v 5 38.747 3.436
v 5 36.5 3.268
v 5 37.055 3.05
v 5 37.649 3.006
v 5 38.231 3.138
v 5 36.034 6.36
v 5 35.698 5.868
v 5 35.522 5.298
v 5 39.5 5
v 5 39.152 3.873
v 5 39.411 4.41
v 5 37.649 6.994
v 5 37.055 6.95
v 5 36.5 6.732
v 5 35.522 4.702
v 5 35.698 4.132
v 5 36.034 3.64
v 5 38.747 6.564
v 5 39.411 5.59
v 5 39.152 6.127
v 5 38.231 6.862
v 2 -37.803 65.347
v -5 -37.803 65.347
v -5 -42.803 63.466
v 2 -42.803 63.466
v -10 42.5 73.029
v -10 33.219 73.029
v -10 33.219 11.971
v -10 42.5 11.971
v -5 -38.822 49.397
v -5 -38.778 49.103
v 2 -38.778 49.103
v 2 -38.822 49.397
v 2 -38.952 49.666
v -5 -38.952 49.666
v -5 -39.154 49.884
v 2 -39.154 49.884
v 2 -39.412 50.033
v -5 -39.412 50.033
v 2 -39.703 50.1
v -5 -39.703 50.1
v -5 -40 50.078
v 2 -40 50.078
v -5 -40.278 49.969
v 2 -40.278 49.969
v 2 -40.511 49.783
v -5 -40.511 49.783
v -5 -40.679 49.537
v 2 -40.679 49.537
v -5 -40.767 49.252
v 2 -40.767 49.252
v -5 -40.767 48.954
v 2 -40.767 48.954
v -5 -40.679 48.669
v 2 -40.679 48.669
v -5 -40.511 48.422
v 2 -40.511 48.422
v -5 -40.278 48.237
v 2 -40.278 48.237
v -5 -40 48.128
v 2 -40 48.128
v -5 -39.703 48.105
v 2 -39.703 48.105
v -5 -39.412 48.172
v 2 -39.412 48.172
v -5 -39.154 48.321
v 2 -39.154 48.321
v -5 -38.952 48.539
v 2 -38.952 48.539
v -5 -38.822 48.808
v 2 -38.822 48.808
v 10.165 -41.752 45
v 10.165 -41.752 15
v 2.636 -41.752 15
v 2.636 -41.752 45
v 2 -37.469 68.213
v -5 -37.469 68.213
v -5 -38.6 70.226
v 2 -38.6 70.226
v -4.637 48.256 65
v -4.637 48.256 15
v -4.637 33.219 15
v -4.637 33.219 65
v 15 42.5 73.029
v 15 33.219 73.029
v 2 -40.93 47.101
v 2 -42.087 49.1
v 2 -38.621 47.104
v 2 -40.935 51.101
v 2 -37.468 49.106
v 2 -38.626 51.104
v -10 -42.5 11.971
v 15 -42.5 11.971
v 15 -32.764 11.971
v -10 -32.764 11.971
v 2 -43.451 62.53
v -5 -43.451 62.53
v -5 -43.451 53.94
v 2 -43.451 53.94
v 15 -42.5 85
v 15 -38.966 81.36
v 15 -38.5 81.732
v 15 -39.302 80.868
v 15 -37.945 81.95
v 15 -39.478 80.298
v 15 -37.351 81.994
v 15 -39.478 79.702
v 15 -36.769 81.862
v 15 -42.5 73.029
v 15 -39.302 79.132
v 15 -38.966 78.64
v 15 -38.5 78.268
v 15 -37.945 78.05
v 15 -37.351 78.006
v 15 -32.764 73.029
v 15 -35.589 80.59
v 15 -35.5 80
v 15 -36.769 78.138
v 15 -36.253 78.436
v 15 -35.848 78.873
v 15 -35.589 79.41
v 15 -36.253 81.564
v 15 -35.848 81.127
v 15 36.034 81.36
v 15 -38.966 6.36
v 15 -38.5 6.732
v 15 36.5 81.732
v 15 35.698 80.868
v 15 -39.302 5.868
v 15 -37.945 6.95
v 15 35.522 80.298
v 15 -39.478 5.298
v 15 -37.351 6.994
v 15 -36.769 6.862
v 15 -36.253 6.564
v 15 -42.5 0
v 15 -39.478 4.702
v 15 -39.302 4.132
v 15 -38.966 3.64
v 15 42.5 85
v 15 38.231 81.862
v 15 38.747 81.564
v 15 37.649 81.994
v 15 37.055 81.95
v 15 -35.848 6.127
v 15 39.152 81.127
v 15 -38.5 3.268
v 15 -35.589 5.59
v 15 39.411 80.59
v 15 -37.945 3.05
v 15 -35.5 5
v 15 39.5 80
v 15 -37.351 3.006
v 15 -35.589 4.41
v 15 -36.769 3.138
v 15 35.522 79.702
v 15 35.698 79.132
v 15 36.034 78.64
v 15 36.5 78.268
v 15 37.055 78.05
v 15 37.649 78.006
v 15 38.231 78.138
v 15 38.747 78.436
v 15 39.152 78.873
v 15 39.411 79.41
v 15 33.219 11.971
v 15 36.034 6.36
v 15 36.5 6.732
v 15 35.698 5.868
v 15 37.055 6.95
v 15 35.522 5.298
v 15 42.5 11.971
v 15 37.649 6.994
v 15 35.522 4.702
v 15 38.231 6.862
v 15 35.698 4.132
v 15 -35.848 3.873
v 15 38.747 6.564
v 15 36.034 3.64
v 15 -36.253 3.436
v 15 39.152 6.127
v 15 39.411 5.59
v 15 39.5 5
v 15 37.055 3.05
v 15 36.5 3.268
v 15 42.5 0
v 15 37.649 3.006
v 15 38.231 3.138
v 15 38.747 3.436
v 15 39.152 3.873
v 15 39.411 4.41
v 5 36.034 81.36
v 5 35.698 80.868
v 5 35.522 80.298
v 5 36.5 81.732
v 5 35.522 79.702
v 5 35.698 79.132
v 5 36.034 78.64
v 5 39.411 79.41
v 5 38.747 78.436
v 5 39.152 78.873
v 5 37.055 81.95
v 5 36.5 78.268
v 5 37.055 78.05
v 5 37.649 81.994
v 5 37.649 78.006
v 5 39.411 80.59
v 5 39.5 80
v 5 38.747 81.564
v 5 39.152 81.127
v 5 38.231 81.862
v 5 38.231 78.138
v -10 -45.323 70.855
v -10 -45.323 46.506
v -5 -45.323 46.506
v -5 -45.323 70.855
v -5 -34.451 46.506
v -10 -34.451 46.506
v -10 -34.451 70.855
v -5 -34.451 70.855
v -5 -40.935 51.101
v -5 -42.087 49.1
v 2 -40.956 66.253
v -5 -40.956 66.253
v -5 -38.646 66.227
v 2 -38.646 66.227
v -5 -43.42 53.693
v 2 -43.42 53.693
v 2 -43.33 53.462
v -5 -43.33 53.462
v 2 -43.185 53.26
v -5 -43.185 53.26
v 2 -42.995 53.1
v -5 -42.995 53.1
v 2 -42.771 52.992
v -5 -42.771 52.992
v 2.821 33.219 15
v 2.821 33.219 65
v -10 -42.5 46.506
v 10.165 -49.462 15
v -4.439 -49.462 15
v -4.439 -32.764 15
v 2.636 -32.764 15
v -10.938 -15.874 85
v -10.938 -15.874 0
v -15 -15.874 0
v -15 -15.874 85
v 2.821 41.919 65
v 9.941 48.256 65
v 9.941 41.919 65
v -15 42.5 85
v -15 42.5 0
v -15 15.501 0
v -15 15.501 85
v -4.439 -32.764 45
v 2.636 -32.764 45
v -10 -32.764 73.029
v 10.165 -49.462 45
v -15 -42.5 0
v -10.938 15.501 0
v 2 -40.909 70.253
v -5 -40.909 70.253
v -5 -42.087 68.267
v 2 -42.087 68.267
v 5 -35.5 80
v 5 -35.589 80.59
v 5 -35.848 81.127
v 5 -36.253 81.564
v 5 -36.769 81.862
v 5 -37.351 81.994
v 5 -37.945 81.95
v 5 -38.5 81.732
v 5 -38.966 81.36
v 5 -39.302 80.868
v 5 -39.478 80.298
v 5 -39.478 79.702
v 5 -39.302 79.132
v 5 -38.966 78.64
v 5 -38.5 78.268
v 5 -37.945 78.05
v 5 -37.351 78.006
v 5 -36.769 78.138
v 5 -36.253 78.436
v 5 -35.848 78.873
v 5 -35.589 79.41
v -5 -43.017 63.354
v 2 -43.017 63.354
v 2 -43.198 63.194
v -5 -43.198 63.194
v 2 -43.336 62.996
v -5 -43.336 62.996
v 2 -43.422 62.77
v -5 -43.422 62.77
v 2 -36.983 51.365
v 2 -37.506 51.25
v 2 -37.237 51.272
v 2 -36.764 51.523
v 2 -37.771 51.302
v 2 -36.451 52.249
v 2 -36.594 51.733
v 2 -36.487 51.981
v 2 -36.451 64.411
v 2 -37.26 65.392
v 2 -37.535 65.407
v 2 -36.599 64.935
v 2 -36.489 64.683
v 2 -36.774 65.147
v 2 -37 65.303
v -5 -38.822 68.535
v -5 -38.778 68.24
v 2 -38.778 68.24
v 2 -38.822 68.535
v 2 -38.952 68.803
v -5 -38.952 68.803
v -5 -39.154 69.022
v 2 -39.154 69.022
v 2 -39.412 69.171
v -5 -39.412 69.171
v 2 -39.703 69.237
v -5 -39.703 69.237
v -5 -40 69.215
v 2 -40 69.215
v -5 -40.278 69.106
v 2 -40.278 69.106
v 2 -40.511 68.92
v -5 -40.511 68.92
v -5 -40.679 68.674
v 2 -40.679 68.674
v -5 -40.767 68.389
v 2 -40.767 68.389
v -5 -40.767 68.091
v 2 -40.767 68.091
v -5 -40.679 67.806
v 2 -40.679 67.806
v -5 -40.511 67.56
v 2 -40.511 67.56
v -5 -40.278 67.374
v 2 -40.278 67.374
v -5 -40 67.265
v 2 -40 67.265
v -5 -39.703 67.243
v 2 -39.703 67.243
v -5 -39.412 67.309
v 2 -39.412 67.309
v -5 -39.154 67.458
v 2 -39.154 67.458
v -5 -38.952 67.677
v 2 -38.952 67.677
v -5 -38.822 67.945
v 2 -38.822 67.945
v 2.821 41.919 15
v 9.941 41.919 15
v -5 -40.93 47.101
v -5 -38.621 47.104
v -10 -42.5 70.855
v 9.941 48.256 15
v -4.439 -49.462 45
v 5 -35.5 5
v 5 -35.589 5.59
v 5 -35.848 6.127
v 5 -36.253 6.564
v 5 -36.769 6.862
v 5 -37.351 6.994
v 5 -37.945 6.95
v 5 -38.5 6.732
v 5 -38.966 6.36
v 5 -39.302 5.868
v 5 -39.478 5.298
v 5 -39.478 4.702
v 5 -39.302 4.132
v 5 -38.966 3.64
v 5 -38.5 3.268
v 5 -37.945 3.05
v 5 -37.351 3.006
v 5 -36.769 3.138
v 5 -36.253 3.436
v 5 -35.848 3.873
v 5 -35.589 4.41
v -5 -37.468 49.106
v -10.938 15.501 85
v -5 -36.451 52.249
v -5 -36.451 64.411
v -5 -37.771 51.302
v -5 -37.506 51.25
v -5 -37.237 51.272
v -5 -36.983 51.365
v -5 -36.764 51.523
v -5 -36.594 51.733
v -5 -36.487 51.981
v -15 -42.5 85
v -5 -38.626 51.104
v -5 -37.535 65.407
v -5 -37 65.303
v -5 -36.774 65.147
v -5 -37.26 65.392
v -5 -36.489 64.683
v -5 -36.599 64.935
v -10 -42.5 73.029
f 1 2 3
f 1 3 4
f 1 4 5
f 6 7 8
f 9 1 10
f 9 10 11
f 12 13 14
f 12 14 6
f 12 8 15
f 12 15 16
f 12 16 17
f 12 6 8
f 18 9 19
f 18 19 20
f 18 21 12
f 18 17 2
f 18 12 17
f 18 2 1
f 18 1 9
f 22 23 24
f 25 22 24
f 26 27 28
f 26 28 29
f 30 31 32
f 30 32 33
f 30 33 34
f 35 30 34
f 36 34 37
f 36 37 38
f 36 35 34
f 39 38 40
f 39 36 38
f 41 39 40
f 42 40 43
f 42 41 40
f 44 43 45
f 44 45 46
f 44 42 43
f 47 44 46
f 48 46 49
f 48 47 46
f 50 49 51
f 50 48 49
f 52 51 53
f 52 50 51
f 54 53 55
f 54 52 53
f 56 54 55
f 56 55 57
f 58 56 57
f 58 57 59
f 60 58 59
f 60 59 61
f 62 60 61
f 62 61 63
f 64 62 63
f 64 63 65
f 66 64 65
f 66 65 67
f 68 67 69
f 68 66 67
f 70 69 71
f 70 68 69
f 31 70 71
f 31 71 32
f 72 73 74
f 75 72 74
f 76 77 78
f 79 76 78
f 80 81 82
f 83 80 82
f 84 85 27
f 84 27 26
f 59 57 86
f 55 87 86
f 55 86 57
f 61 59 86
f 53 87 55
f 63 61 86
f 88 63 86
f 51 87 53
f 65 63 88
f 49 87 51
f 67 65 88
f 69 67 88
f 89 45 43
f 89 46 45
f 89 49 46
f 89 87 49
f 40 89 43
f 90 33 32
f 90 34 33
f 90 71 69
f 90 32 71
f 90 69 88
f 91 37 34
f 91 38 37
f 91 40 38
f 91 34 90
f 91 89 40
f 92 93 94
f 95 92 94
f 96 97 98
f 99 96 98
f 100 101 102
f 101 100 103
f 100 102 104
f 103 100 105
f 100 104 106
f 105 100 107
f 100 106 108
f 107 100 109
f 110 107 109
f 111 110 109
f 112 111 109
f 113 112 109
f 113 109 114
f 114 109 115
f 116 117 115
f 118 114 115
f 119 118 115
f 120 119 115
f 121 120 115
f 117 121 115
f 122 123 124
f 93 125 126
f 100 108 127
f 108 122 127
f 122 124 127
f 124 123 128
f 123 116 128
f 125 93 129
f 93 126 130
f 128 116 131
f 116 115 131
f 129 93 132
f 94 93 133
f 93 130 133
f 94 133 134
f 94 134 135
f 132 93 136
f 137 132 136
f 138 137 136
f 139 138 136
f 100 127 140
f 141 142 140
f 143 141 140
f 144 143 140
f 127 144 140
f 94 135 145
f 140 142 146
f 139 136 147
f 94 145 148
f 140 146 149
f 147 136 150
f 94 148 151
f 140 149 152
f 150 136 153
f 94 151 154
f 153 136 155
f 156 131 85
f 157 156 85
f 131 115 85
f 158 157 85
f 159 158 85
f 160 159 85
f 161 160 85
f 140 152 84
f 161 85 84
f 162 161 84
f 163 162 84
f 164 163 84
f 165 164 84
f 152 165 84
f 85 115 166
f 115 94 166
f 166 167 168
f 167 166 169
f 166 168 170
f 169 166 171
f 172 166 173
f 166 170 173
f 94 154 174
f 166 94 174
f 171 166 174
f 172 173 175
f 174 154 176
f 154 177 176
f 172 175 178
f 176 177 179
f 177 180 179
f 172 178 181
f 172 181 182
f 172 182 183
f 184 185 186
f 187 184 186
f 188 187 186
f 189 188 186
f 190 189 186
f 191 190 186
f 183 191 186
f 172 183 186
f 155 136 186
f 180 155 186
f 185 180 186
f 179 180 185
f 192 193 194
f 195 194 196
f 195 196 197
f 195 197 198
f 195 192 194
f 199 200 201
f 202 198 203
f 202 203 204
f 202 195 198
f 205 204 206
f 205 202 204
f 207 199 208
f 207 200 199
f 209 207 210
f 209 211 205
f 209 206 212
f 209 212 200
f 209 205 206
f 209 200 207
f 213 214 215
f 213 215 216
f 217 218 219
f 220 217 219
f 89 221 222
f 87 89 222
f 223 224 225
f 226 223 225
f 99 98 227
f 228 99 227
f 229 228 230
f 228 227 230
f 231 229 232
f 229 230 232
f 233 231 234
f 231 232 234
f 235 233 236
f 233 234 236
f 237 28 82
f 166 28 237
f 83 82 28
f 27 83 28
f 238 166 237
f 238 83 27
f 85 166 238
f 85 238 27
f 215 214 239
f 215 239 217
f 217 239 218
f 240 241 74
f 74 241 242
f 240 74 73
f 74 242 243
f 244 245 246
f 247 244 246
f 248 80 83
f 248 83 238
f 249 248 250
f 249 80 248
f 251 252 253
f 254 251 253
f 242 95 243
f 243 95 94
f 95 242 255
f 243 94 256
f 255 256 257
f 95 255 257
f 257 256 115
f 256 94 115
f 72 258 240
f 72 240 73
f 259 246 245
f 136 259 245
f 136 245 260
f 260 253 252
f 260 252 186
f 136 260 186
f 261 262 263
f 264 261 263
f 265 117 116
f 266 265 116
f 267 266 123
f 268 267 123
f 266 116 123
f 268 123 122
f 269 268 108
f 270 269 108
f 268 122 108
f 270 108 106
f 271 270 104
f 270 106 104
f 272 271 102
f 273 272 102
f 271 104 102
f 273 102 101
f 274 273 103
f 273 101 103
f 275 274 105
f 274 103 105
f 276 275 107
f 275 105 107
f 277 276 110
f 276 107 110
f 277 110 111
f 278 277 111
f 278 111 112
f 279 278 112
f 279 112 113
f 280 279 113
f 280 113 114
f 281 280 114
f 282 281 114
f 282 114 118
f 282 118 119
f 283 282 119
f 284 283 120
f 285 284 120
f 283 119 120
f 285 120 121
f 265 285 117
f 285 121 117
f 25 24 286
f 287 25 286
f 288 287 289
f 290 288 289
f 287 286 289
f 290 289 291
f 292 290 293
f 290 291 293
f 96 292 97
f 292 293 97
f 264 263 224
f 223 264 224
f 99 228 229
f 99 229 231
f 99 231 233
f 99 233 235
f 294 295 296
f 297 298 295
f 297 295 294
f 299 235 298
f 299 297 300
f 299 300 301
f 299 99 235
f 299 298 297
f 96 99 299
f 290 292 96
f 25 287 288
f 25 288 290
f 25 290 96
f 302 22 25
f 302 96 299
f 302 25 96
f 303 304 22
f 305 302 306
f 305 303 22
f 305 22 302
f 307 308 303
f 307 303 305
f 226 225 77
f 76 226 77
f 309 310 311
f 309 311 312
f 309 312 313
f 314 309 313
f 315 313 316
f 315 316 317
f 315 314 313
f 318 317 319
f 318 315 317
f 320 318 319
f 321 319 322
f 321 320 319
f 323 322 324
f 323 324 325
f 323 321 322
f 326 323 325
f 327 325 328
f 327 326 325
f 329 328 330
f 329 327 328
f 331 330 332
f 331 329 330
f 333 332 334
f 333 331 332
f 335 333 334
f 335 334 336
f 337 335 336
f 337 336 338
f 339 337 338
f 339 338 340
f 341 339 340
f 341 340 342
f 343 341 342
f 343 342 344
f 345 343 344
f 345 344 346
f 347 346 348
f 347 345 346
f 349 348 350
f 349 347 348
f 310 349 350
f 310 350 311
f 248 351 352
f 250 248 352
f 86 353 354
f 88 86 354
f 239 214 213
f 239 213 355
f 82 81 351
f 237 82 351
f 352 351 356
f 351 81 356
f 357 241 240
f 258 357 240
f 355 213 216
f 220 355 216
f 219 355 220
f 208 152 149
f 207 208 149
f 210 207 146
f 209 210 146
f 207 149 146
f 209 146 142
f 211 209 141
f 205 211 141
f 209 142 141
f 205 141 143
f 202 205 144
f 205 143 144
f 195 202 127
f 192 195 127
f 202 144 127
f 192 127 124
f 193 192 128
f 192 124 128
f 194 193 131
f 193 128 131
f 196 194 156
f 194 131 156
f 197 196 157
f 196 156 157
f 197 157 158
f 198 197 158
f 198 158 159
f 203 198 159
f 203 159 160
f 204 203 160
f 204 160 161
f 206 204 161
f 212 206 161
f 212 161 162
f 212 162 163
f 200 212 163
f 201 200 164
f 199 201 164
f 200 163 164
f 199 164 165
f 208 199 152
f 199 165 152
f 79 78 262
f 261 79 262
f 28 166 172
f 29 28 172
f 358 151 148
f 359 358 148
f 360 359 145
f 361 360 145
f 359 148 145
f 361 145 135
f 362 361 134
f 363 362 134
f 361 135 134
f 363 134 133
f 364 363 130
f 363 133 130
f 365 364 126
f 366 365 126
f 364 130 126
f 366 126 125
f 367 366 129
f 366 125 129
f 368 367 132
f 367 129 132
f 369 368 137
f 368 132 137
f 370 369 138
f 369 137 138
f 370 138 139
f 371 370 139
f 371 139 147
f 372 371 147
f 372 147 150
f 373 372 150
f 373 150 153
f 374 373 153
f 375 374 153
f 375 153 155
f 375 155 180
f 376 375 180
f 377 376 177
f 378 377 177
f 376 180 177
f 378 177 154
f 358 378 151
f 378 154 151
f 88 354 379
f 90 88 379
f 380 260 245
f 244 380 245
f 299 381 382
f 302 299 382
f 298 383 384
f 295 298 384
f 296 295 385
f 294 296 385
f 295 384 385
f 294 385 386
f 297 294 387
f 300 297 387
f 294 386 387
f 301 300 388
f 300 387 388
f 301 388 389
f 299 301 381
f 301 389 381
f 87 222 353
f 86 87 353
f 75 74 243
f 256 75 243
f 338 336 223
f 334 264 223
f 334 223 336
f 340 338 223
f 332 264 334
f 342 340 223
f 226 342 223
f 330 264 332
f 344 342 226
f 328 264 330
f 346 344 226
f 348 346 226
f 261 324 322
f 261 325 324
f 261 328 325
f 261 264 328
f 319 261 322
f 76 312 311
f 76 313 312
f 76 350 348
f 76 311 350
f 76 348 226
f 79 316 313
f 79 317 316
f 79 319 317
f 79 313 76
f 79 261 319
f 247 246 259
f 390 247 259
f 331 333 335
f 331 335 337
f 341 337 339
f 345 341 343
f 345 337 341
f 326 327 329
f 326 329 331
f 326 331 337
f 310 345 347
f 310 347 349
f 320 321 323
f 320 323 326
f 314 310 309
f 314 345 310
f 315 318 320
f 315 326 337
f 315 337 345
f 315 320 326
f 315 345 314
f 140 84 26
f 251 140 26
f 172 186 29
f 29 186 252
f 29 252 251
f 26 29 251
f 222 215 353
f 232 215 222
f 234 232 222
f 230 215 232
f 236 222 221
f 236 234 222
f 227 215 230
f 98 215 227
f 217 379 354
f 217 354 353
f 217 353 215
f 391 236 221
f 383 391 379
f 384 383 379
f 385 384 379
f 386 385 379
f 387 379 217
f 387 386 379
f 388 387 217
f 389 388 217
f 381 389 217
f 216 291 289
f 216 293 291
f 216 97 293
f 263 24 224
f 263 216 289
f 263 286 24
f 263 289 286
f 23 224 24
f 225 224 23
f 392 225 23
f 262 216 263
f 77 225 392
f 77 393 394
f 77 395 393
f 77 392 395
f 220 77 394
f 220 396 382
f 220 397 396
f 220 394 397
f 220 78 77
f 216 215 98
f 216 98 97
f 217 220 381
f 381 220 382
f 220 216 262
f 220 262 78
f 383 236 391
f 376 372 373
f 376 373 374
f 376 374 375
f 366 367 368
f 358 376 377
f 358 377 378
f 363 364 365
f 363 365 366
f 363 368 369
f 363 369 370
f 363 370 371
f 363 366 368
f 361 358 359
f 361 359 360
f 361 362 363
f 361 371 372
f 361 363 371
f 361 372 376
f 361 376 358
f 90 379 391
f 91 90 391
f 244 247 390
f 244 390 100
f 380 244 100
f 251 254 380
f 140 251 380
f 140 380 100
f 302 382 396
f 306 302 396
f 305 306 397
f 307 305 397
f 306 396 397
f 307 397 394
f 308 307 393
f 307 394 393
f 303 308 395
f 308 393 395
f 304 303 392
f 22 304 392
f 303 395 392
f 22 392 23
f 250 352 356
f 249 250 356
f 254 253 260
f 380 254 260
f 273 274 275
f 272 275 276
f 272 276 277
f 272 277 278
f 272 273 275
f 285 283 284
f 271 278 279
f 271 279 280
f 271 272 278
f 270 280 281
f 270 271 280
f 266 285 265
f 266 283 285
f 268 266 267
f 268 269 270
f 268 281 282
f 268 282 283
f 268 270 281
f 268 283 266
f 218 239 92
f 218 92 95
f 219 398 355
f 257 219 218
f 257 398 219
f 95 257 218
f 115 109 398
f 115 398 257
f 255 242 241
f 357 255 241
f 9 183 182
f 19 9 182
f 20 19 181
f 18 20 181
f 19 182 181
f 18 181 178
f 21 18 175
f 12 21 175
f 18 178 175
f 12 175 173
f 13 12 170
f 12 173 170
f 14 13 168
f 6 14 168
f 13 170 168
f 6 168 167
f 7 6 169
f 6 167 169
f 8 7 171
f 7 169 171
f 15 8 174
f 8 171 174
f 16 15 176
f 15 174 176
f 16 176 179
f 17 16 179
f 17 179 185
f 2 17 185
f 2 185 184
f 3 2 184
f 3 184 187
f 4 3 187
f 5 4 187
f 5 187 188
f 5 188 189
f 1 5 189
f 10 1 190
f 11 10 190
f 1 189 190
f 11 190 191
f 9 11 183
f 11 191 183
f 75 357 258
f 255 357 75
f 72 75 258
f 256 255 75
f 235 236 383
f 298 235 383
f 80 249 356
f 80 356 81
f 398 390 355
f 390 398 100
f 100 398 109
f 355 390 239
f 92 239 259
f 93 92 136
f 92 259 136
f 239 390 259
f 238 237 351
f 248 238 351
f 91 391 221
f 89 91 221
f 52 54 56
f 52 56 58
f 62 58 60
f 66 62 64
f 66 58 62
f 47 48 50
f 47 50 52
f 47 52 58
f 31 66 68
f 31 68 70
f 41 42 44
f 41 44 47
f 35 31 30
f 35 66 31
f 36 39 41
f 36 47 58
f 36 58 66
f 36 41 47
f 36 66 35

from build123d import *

# Parameters (mm, degrees)
F1_DEPTH  = 85
F2_R      = 2
F3_DEPTH  = 10
F4_W      = 19.472218
F4_H      = 61.057516
F4_W_2    = 18.561906
F5_DEPTH  = 25
F8_DEPTH  = 50
F10_DEPTH = 30
F11_W     = 10.871612
F11_H     = 24.349149
F12_DEPTH = 5
F13_R     = 1
F14_DEPTH = 7


with BuildPart() as f1:
    # F0 (on Top) → F1 (new body)
    with BuildSketch(Plane.XY):
        Polygon((15, 42.5), (-15, 42.5), (-15, 15.500662), (-10.938493, 15.500662), (-10.938493, -15.873631), (-15, -15.873631), (-15, -42.5), (15, -42.5), align=None)
    extrude(amount=F1_DEPTH)

    # F2 (on face) → F3 (cut)
    with BuildSketch(Plane.YZ.offset(15)):
        with Locations((-37.5, 5)):
            Circle(F2_R)
        with Locations((37.5, 5)):
            Circle(F2_R)
        with Locations((37.5, 80)):
            Circle(F2_R)
        with Locations((-37.5, 80)):
            Circle(F2_R)
    extrude(amount=-F3_DEPTH, mode=Mode.SUBTRACT)

    # F4 (on face) → F5 (cut)
    with BuildSketch(Plane.YZ.offset(15)):
        with Locations((-42.5, 42.5)):
            Rectangle(F4_W, F4_H)
        with Locations((42.5, 42.5)):
            Rectangle(F4_W_2, F4_H)
    extrude(amount=-F5_DEPTH, mode=Mode.SUBTRACT)

    # F7 (on offset) → F8 (join)
    with BuildSketch(Plane.XY.offset(15)):
        Polygon((-4.637186, 48.255824), (-4.637186, 33.027273), (2.820976, 33.027273), (2.820976, 41.918974), (9.94103, 41.918974), (9.94103, 48.255824), (2.820976, 48.255824), align=None)
    extrude(amount=F8_DEPTH)

    # F9 (on offset) → F10 (join)
    with BuildSketch(Plane.XY.offset(15)):
        Polygon((2.636472, -32.500222), (-4.438653, -32.500222), (-4.438653, -49.462382), (2.636472, -49.462382), (10.165131, -49.462382), (10.165131, -41.752309), (2.636472, -41.752309), align=None)
    extrude(amount=F10_DEPTH)

    # F11 (on face) → F12 (join)
    with BuildSketch(Plane.YZ.offset(-10)):
        with Locations((-39.88678, 58.680521)):
            Rectangle(F11_W, F11_H)
    extrude(amount=F12_DEPTH)

    # F13 (on face) → F14 (join)
    with BuildSketch(Plane.YZ.offset(-5)):
        with BuildLine():
            Line((-36.450974, 52.248876), (-36.450974, 64.410565))
            ThreePointArc((-36.450974, 64.410565), (-36.881787, 65.232773), (-37.803027, 65.346545))
            Line((-37.803027, 65.346545), (-42.803027, 63.465884))
            ThreePointArc((-42.803027, 63.465884), (-43.273182, 63.099091), (-43.450974, 62.529904))
            Line((-43.450974, 62.529904), (-43.450974, 53.939643))
            ThreePointArc((-43.450974, 53.939643), (-43.263481, 53.356691), (-42.771309, 52.992339))
            Line((-42.771309, 52.992339), (-37.771309, 51.301572))
            ThreePointArc((-37.771309, 51.301572), (-36.868022, 51.436369), (-36.450974, 52.248876))
        make_face()
        Polygon((-42.087062, 68.266637), (-40.955583, 66.253409), (-38.646336, 66.226684), (-37.468569, 68.213188), (-38.600048, 70.226416), (-40.909294, 70.253141), align=None)
        with Locations((-39.777815, 68.239912)):
            Circle(F13_R, mode=Mode.SUBTRACT)
        Polygon((-42.087215, 49.099645), (-40.929939, 47.101134), (-38.62054, 47.104108), (-37.468416, 49.105594), (-38.625692, 51.104105), (-40.935091, 51.10113), align=None)
        with Locations((-39.777815, 49.102619)):
            Circle(F13_R, mode=Mode.SUBTRACT)
    extrude(amount=F14_DEPTH)


solid = f1.part
